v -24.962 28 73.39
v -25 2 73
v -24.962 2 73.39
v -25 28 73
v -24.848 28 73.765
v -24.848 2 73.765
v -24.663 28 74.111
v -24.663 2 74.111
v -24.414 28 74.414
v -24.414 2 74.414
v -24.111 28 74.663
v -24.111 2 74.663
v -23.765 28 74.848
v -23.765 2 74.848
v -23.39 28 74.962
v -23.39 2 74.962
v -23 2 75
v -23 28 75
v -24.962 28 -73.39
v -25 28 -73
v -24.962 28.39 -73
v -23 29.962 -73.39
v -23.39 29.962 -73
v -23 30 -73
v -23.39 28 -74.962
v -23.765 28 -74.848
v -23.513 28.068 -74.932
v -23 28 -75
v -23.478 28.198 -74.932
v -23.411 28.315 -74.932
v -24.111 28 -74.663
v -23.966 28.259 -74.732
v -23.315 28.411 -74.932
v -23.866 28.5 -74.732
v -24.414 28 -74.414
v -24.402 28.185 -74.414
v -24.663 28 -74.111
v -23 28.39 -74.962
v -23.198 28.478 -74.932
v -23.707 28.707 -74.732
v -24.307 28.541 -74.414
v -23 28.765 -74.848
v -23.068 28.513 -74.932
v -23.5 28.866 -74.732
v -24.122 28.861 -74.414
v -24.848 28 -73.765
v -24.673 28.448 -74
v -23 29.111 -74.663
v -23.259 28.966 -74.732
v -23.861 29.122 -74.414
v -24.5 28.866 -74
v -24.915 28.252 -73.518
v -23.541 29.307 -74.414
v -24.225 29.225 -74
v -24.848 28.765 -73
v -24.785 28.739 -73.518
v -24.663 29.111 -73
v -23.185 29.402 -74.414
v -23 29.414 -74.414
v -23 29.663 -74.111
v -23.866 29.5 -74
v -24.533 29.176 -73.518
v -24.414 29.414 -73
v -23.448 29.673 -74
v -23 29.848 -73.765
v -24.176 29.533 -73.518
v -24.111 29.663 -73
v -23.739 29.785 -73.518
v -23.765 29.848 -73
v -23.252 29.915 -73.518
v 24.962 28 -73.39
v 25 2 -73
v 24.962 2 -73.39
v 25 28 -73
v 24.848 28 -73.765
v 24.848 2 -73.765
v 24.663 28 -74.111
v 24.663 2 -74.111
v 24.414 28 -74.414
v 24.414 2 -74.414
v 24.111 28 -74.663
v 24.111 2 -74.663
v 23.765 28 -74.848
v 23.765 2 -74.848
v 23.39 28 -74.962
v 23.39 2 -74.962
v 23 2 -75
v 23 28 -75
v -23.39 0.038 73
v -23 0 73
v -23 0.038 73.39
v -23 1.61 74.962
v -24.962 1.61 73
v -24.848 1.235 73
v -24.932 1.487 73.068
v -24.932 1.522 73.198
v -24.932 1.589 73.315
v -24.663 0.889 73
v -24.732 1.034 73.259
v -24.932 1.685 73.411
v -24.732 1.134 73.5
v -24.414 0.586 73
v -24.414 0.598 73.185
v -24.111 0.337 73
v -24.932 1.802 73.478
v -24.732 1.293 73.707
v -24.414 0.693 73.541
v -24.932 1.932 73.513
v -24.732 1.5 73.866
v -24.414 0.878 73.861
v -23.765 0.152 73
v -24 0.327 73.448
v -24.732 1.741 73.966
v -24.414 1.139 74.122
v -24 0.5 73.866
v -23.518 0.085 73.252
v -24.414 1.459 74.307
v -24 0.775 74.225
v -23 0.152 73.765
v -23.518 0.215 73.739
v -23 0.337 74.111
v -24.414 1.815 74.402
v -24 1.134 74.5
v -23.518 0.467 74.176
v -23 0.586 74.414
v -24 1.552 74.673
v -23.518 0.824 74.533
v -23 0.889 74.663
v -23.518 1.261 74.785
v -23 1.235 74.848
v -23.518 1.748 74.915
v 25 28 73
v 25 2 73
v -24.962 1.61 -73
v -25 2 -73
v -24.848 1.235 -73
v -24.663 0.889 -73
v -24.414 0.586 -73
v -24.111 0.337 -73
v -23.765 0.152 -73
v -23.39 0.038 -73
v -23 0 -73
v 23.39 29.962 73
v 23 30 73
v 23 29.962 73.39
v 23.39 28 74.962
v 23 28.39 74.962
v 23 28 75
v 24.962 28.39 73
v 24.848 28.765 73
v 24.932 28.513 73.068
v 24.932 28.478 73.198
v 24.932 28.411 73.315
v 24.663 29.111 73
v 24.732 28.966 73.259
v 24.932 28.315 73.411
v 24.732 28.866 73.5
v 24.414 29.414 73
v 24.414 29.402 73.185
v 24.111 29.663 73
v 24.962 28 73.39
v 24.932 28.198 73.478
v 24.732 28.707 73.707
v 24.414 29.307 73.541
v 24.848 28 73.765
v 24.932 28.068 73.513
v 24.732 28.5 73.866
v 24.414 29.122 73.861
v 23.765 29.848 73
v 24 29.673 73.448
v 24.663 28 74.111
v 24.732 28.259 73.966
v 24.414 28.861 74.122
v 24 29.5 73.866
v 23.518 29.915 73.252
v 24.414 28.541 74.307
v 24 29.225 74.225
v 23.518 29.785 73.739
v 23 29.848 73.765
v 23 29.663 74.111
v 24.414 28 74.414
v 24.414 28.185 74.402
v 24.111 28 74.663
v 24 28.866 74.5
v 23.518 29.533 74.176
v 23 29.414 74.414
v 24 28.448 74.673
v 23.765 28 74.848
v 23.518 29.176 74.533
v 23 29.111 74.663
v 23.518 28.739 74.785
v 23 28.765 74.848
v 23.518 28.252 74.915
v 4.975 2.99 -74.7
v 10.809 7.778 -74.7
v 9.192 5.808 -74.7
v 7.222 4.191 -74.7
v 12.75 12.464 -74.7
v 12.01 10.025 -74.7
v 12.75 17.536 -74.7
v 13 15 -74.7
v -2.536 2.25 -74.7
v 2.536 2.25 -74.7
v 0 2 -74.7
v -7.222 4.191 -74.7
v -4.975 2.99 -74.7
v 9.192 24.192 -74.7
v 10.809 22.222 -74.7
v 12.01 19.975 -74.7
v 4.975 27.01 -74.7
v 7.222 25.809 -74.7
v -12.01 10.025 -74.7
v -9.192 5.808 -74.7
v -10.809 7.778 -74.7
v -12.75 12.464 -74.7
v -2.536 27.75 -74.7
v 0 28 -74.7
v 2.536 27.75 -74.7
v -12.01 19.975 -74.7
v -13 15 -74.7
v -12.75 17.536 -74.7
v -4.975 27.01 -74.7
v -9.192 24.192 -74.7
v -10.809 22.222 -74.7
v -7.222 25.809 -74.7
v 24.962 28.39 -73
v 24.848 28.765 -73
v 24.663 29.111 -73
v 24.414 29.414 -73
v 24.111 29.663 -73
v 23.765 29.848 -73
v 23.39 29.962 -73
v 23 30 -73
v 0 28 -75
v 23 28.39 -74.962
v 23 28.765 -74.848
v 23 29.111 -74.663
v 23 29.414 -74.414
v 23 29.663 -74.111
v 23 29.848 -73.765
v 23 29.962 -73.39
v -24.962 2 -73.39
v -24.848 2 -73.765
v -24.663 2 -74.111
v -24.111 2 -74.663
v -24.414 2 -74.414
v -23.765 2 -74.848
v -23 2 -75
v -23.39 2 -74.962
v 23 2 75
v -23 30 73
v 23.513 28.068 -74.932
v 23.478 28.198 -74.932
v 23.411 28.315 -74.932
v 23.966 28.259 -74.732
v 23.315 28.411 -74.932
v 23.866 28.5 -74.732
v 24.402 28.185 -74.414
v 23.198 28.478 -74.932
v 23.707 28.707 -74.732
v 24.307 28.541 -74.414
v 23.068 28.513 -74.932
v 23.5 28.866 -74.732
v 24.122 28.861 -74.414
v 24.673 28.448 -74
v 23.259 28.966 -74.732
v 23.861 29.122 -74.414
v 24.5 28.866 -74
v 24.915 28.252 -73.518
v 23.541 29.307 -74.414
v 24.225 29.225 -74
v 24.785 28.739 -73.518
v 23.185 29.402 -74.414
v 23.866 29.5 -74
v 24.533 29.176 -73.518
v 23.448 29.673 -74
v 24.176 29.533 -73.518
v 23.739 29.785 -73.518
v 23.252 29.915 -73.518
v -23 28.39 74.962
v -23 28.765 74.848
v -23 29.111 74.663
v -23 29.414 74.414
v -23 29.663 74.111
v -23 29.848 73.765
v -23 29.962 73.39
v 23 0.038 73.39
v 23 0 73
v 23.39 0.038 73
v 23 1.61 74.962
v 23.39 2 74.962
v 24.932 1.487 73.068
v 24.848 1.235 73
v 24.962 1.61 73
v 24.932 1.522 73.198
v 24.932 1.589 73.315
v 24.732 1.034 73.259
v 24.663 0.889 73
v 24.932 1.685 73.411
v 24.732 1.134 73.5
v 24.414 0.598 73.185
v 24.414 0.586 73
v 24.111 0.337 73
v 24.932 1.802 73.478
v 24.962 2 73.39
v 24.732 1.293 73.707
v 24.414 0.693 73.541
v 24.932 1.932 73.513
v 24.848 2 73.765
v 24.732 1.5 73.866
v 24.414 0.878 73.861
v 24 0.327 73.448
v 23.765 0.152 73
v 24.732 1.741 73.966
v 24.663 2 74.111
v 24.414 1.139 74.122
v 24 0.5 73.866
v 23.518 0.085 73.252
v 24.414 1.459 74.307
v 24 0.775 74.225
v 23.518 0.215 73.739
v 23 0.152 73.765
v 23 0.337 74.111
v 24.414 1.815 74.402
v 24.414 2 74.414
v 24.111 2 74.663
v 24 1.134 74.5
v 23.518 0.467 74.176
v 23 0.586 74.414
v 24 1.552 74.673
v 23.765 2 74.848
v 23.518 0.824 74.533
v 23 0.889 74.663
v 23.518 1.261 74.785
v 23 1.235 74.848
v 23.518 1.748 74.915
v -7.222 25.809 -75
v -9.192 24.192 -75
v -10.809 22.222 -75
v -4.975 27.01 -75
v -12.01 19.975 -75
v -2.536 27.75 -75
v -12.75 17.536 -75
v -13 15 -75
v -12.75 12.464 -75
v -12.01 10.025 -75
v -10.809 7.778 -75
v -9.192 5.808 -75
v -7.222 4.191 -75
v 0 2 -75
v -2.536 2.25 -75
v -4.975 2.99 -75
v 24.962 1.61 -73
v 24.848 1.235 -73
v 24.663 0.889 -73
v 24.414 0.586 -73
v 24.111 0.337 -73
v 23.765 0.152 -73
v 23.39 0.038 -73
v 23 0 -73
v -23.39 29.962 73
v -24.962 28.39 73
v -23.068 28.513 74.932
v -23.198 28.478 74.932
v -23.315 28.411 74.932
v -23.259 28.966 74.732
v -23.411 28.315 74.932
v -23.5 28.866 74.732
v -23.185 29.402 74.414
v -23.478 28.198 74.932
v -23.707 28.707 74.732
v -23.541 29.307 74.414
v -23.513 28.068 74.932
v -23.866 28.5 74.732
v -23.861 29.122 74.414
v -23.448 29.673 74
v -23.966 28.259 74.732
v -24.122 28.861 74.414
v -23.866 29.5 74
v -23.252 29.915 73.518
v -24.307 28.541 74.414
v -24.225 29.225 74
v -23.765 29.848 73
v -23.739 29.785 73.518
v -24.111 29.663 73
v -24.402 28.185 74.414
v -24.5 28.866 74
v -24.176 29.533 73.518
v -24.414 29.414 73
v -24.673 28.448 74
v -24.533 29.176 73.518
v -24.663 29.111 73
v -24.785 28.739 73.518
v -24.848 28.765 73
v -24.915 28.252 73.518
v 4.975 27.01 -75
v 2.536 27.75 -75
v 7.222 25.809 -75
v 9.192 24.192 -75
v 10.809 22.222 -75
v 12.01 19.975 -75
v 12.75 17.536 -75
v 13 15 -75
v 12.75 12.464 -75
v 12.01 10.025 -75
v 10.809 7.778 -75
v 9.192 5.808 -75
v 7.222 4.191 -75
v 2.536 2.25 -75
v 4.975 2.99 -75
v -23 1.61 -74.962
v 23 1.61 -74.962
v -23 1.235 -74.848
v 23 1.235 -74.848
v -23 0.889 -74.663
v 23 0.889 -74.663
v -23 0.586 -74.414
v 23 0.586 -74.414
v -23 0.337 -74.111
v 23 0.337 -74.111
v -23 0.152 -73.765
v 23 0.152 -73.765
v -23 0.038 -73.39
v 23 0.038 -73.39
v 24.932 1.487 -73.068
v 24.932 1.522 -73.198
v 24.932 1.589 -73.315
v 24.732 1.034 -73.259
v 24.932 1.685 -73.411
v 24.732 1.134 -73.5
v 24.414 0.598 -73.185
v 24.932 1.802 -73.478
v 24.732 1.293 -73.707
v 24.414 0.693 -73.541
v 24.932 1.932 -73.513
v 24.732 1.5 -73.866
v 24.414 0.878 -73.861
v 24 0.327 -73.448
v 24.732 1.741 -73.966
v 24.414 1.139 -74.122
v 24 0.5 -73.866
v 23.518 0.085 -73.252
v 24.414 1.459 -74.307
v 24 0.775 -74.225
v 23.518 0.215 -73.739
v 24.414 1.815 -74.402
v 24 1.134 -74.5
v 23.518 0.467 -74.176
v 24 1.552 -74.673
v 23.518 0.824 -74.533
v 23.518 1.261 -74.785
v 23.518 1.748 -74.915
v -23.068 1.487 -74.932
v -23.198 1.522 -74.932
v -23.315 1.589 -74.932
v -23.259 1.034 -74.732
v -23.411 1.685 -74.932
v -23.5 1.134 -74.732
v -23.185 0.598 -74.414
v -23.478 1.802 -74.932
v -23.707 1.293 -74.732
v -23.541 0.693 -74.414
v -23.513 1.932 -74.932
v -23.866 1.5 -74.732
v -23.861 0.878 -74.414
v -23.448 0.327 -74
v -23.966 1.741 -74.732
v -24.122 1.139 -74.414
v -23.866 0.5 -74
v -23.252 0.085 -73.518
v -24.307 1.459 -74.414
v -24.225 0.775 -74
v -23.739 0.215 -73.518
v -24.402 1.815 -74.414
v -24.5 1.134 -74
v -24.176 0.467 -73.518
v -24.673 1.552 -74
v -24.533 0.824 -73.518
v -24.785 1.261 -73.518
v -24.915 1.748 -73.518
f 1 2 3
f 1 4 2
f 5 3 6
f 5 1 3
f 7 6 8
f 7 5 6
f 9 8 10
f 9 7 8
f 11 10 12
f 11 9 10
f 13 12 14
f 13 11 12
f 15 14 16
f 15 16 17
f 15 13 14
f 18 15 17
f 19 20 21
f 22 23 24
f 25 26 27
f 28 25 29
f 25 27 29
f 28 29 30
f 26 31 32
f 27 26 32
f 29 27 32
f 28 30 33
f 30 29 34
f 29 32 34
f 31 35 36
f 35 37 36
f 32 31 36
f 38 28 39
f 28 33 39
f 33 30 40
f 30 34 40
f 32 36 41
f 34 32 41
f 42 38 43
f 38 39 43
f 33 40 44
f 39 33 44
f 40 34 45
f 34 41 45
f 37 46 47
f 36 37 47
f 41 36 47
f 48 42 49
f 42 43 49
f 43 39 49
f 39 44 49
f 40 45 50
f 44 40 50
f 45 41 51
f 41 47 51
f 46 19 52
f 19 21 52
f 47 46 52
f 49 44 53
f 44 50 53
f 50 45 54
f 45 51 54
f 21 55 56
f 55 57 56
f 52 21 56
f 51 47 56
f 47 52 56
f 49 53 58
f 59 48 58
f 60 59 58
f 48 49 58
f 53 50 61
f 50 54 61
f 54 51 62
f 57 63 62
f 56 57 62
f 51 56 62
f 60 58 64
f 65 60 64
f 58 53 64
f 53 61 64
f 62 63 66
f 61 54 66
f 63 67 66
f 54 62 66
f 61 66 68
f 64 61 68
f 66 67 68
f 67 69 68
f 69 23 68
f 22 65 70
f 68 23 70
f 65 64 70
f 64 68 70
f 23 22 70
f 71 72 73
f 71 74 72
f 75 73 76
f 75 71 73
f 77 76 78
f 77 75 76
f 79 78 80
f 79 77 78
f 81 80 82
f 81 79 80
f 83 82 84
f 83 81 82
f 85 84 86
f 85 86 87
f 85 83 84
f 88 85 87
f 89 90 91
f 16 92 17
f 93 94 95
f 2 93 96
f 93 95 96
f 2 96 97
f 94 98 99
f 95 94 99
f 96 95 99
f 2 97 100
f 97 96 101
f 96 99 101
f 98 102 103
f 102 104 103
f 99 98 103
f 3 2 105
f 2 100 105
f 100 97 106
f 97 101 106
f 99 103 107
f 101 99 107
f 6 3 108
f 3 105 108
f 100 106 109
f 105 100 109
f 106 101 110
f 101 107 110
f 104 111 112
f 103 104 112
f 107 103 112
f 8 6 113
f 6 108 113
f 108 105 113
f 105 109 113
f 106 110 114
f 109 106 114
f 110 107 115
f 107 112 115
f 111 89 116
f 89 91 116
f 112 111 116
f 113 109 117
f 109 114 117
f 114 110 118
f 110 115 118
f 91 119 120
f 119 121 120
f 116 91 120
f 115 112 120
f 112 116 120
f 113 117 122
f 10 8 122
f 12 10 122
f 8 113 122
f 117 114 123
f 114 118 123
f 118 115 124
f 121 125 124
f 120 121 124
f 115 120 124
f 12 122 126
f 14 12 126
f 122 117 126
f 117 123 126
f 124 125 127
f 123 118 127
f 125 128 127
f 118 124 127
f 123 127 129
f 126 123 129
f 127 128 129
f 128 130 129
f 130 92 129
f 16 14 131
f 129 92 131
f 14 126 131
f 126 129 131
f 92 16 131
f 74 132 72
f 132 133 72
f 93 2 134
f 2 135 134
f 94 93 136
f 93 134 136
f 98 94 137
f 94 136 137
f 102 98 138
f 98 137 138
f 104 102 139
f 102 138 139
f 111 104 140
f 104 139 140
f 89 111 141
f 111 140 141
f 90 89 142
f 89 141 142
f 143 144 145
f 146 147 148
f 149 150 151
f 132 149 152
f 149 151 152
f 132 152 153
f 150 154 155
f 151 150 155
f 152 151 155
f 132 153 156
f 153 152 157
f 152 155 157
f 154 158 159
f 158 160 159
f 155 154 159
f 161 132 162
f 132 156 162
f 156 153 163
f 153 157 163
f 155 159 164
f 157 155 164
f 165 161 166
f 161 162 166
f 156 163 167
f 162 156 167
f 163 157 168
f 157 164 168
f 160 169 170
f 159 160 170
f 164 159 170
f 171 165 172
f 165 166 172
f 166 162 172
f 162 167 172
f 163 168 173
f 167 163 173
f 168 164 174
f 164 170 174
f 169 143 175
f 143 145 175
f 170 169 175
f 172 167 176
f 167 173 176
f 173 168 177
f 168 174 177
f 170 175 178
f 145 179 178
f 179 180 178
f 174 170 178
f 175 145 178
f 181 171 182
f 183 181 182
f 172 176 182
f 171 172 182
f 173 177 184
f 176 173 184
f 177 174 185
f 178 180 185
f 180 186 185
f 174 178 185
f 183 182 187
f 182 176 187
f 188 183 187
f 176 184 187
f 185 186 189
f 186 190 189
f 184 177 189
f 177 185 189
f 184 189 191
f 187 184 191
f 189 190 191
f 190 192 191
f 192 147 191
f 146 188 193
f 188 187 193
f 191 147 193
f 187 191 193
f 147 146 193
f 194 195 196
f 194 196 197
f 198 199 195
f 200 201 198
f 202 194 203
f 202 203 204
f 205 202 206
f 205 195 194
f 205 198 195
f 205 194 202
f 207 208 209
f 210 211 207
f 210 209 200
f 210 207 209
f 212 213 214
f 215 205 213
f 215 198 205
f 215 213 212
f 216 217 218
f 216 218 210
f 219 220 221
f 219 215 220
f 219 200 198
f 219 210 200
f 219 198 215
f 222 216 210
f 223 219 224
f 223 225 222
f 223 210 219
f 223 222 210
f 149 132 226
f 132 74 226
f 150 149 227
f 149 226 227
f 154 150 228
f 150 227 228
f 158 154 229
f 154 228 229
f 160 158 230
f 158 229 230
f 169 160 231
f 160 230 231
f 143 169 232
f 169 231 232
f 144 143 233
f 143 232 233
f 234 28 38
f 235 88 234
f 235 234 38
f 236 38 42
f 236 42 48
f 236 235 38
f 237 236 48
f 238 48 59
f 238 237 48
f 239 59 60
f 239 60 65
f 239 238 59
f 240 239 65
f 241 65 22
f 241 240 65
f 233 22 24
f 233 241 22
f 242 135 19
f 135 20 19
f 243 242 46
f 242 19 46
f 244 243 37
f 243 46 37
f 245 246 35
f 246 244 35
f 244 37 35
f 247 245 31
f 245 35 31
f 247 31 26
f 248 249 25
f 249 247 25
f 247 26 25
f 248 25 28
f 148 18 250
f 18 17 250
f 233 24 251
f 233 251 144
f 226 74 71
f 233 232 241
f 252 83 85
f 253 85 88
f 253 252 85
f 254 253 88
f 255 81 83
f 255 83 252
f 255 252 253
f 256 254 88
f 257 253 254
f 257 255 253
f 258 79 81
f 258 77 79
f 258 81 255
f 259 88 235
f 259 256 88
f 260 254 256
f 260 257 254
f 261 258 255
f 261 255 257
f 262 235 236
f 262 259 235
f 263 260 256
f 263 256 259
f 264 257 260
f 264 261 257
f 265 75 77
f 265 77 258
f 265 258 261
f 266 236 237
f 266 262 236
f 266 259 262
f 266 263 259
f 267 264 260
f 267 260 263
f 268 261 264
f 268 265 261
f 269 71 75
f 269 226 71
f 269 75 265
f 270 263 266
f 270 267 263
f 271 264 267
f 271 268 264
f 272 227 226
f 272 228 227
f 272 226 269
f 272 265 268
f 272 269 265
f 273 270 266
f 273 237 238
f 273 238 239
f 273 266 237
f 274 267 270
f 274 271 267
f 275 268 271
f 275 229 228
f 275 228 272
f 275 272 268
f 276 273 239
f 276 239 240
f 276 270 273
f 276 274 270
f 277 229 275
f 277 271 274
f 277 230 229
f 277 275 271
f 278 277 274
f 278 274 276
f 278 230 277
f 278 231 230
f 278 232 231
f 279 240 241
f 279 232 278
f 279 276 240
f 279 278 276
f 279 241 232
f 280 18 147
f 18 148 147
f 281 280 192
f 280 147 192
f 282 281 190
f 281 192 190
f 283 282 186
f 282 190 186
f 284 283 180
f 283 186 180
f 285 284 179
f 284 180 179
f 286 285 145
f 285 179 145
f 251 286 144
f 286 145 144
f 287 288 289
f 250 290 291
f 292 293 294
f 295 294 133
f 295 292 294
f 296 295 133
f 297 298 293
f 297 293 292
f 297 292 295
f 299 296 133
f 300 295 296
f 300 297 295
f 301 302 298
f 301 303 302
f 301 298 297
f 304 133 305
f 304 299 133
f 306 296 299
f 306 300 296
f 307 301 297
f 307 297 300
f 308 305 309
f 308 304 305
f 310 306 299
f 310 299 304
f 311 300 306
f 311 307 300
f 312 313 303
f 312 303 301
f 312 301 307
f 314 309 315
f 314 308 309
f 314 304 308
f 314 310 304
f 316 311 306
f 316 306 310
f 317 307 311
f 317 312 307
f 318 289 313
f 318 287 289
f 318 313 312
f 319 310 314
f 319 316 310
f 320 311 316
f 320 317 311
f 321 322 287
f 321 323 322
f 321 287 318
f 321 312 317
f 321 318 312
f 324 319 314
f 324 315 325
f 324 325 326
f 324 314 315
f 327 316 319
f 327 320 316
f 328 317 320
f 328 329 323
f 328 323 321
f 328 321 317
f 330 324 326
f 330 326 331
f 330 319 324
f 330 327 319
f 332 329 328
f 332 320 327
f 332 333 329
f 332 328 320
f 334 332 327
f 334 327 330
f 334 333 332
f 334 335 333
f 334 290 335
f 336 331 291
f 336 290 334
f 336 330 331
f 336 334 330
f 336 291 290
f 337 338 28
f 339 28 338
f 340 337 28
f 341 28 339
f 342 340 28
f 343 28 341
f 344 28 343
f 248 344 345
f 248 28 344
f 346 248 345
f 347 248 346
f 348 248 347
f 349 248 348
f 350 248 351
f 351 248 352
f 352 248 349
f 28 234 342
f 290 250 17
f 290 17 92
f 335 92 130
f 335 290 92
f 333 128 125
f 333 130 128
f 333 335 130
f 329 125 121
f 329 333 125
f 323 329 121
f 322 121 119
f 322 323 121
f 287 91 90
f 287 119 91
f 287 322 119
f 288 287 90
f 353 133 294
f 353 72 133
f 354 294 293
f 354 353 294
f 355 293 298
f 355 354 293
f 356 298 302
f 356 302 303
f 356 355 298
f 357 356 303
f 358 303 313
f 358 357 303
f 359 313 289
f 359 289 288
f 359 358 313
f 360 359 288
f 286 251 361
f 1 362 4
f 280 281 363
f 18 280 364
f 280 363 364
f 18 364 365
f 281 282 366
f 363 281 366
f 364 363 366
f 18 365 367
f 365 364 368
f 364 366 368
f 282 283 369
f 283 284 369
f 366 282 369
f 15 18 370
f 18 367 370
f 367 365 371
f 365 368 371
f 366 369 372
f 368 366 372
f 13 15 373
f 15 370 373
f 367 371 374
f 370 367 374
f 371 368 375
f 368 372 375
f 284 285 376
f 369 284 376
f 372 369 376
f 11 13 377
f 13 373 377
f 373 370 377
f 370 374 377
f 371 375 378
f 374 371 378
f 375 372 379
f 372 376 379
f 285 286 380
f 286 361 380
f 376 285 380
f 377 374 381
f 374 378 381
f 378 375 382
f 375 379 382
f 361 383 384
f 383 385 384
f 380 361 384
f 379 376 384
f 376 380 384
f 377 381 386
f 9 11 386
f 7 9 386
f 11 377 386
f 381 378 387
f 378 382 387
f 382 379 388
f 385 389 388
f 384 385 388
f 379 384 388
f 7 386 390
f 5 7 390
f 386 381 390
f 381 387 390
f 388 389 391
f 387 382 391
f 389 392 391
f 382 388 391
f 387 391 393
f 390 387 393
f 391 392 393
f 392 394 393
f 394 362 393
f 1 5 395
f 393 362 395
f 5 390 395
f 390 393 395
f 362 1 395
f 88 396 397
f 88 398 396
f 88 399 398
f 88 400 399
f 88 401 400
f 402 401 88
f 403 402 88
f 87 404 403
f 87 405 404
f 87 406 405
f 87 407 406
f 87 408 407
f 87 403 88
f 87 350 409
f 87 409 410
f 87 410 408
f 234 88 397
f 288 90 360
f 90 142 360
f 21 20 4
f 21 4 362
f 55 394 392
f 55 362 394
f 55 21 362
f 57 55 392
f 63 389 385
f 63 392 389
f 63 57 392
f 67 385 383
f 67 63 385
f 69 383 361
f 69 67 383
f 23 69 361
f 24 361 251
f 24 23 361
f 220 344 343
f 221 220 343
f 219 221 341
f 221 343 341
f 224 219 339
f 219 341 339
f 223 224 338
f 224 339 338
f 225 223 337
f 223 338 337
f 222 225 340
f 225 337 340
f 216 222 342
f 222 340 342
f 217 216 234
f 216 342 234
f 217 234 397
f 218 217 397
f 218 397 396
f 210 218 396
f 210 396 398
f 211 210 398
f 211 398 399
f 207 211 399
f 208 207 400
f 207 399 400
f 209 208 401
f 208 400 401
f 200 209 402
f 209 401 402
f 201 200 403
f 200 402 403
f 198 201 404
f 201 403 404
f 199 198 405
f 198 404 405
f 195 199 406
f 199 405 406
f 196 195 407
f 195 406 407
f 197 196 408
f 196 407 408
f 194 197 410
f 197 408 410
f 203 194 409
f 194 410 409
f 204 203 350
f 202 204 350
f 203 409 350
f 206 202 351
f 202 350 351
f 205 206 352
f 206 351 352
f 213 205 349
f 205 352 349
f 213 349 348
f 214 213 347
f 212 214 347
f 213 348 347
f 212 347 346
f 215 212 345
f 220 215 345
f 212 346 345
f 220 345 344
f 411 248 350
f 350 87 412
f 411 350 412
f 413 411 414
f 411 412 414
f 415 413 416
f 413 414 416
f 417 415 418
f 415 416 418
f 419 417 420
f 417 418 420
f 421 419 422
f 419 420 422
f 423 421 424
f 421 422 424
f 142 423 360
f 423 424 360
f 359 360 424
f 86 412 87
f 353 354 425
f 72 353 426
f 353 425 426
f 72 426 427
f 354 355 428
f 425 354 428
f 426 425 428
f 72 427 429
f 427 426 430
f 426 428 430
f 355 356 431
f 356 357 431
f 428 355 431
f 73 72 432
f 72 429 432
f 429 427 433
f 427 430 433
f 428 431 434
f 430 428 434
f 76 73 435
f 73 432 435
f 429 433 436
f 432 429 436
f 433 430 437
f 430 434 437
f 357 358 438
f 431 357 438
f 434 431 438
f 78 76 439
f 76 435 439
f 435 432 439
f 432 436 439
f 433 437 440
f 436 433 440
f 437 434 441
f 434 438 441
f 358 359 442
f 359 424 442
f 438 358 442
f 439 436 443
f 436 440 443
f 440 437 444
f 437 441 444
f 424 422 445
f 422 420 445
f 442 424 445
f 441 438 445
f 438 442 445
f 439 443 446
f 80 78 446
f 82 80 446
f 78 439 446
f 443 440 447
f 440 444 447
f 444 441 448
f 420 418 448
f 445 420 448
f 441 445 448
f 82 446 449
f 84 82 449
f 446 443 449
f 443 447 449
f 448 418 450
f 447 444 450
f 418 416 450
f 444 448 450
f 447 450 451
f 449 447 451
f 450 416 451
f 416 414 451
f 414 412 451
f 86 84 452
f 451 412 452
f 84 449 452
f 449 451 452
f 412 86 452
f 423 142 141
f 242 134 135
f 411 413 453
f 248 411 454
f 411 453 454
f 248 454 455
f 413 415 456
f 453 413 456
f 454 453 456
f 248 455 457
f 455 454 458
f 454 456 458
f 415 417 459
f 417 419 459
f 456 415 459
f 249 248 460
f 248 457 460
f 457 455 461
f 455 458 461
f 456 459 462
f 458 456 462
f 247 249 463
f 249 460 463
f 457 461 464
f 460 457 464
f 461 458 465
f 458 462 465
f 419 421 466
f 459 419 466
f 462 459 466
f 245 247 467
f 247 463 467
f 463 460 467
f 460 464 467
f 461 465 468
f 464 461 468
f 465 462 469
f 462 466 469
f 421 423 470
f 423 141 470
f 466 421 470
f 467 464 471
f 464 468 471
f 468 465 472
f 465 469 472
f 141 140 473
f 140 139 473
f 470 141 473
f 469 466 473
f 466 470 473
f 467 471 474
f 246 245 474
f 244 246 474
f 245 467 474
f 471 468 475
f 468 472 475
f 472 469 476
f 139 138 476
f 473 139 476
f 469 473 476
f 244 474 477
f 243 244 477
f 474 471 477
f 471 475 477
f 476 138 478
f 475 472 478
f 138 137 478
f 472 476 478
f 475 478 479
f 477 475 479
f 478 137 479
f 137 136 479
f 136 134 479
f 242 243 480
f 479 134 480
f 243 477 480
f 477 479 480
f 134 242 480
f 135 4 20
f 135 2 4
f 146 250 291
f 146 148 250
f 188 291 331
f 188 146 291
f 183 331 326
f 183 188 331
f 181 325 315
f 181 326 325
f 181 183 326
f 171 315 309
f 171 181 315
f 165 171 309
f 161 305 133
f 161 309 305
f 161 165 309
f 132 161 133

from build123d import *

# Parameters (mm, degrees)
SKETCH2_W           = 50
SKETCH2_H           = 150
BOSS_EXTRUDE1_DEPTH = 30
FILLET1_R           = 2
SKETCH3_R           = 13
CUT_EXTRUDE1_DEPTH  = 0.3


with BuildPart() as part:
    # Sketch2 → Boss-Extrude1 (new body)
    with BuildSketch(Plane(origin=(0, 0, 0), x_dir=(1, 0, 0), z_dir=(0, 1, 0))):
        Rectangle(SKETCH2_W, SKETCH2_H)
    extrude(amount=BOSS_EXTRUDE1_DEPTH)

    # Fillet1
    fillet1_edges = [part.edges().sort_by_distance(p)[0] for p in [
        (-25, 30, 0),
        (0, 30, 75),
        (25, 30, 0),
        (0, 0, 75),
        (-25, 0, 0),
        (0, 0, -75),
        (25, 0, 0),
        (25, 15, 75),
        (-25, 15, 75),
        (-25, 15, -75),
        (25, 15, -75),
        (0, 30, -75),
    ]]
    fillet(fillet1_edges, radius=FILLET1_R)

    # Sketch3 → Cut-Extrude1 (cut)
    with BuildSketch(Plane(origin=(0, 0, -75), x_dir=(-1, 0, 0), z_dir=(0, 0, -1))):
        with Locations((0, 15)):
            Circle(SKETCH3_R)
    extrude(amount=-CUT_EXTRUDE1_DEPTH, mode=Mode.SUBTRACT)


solid = part.part
